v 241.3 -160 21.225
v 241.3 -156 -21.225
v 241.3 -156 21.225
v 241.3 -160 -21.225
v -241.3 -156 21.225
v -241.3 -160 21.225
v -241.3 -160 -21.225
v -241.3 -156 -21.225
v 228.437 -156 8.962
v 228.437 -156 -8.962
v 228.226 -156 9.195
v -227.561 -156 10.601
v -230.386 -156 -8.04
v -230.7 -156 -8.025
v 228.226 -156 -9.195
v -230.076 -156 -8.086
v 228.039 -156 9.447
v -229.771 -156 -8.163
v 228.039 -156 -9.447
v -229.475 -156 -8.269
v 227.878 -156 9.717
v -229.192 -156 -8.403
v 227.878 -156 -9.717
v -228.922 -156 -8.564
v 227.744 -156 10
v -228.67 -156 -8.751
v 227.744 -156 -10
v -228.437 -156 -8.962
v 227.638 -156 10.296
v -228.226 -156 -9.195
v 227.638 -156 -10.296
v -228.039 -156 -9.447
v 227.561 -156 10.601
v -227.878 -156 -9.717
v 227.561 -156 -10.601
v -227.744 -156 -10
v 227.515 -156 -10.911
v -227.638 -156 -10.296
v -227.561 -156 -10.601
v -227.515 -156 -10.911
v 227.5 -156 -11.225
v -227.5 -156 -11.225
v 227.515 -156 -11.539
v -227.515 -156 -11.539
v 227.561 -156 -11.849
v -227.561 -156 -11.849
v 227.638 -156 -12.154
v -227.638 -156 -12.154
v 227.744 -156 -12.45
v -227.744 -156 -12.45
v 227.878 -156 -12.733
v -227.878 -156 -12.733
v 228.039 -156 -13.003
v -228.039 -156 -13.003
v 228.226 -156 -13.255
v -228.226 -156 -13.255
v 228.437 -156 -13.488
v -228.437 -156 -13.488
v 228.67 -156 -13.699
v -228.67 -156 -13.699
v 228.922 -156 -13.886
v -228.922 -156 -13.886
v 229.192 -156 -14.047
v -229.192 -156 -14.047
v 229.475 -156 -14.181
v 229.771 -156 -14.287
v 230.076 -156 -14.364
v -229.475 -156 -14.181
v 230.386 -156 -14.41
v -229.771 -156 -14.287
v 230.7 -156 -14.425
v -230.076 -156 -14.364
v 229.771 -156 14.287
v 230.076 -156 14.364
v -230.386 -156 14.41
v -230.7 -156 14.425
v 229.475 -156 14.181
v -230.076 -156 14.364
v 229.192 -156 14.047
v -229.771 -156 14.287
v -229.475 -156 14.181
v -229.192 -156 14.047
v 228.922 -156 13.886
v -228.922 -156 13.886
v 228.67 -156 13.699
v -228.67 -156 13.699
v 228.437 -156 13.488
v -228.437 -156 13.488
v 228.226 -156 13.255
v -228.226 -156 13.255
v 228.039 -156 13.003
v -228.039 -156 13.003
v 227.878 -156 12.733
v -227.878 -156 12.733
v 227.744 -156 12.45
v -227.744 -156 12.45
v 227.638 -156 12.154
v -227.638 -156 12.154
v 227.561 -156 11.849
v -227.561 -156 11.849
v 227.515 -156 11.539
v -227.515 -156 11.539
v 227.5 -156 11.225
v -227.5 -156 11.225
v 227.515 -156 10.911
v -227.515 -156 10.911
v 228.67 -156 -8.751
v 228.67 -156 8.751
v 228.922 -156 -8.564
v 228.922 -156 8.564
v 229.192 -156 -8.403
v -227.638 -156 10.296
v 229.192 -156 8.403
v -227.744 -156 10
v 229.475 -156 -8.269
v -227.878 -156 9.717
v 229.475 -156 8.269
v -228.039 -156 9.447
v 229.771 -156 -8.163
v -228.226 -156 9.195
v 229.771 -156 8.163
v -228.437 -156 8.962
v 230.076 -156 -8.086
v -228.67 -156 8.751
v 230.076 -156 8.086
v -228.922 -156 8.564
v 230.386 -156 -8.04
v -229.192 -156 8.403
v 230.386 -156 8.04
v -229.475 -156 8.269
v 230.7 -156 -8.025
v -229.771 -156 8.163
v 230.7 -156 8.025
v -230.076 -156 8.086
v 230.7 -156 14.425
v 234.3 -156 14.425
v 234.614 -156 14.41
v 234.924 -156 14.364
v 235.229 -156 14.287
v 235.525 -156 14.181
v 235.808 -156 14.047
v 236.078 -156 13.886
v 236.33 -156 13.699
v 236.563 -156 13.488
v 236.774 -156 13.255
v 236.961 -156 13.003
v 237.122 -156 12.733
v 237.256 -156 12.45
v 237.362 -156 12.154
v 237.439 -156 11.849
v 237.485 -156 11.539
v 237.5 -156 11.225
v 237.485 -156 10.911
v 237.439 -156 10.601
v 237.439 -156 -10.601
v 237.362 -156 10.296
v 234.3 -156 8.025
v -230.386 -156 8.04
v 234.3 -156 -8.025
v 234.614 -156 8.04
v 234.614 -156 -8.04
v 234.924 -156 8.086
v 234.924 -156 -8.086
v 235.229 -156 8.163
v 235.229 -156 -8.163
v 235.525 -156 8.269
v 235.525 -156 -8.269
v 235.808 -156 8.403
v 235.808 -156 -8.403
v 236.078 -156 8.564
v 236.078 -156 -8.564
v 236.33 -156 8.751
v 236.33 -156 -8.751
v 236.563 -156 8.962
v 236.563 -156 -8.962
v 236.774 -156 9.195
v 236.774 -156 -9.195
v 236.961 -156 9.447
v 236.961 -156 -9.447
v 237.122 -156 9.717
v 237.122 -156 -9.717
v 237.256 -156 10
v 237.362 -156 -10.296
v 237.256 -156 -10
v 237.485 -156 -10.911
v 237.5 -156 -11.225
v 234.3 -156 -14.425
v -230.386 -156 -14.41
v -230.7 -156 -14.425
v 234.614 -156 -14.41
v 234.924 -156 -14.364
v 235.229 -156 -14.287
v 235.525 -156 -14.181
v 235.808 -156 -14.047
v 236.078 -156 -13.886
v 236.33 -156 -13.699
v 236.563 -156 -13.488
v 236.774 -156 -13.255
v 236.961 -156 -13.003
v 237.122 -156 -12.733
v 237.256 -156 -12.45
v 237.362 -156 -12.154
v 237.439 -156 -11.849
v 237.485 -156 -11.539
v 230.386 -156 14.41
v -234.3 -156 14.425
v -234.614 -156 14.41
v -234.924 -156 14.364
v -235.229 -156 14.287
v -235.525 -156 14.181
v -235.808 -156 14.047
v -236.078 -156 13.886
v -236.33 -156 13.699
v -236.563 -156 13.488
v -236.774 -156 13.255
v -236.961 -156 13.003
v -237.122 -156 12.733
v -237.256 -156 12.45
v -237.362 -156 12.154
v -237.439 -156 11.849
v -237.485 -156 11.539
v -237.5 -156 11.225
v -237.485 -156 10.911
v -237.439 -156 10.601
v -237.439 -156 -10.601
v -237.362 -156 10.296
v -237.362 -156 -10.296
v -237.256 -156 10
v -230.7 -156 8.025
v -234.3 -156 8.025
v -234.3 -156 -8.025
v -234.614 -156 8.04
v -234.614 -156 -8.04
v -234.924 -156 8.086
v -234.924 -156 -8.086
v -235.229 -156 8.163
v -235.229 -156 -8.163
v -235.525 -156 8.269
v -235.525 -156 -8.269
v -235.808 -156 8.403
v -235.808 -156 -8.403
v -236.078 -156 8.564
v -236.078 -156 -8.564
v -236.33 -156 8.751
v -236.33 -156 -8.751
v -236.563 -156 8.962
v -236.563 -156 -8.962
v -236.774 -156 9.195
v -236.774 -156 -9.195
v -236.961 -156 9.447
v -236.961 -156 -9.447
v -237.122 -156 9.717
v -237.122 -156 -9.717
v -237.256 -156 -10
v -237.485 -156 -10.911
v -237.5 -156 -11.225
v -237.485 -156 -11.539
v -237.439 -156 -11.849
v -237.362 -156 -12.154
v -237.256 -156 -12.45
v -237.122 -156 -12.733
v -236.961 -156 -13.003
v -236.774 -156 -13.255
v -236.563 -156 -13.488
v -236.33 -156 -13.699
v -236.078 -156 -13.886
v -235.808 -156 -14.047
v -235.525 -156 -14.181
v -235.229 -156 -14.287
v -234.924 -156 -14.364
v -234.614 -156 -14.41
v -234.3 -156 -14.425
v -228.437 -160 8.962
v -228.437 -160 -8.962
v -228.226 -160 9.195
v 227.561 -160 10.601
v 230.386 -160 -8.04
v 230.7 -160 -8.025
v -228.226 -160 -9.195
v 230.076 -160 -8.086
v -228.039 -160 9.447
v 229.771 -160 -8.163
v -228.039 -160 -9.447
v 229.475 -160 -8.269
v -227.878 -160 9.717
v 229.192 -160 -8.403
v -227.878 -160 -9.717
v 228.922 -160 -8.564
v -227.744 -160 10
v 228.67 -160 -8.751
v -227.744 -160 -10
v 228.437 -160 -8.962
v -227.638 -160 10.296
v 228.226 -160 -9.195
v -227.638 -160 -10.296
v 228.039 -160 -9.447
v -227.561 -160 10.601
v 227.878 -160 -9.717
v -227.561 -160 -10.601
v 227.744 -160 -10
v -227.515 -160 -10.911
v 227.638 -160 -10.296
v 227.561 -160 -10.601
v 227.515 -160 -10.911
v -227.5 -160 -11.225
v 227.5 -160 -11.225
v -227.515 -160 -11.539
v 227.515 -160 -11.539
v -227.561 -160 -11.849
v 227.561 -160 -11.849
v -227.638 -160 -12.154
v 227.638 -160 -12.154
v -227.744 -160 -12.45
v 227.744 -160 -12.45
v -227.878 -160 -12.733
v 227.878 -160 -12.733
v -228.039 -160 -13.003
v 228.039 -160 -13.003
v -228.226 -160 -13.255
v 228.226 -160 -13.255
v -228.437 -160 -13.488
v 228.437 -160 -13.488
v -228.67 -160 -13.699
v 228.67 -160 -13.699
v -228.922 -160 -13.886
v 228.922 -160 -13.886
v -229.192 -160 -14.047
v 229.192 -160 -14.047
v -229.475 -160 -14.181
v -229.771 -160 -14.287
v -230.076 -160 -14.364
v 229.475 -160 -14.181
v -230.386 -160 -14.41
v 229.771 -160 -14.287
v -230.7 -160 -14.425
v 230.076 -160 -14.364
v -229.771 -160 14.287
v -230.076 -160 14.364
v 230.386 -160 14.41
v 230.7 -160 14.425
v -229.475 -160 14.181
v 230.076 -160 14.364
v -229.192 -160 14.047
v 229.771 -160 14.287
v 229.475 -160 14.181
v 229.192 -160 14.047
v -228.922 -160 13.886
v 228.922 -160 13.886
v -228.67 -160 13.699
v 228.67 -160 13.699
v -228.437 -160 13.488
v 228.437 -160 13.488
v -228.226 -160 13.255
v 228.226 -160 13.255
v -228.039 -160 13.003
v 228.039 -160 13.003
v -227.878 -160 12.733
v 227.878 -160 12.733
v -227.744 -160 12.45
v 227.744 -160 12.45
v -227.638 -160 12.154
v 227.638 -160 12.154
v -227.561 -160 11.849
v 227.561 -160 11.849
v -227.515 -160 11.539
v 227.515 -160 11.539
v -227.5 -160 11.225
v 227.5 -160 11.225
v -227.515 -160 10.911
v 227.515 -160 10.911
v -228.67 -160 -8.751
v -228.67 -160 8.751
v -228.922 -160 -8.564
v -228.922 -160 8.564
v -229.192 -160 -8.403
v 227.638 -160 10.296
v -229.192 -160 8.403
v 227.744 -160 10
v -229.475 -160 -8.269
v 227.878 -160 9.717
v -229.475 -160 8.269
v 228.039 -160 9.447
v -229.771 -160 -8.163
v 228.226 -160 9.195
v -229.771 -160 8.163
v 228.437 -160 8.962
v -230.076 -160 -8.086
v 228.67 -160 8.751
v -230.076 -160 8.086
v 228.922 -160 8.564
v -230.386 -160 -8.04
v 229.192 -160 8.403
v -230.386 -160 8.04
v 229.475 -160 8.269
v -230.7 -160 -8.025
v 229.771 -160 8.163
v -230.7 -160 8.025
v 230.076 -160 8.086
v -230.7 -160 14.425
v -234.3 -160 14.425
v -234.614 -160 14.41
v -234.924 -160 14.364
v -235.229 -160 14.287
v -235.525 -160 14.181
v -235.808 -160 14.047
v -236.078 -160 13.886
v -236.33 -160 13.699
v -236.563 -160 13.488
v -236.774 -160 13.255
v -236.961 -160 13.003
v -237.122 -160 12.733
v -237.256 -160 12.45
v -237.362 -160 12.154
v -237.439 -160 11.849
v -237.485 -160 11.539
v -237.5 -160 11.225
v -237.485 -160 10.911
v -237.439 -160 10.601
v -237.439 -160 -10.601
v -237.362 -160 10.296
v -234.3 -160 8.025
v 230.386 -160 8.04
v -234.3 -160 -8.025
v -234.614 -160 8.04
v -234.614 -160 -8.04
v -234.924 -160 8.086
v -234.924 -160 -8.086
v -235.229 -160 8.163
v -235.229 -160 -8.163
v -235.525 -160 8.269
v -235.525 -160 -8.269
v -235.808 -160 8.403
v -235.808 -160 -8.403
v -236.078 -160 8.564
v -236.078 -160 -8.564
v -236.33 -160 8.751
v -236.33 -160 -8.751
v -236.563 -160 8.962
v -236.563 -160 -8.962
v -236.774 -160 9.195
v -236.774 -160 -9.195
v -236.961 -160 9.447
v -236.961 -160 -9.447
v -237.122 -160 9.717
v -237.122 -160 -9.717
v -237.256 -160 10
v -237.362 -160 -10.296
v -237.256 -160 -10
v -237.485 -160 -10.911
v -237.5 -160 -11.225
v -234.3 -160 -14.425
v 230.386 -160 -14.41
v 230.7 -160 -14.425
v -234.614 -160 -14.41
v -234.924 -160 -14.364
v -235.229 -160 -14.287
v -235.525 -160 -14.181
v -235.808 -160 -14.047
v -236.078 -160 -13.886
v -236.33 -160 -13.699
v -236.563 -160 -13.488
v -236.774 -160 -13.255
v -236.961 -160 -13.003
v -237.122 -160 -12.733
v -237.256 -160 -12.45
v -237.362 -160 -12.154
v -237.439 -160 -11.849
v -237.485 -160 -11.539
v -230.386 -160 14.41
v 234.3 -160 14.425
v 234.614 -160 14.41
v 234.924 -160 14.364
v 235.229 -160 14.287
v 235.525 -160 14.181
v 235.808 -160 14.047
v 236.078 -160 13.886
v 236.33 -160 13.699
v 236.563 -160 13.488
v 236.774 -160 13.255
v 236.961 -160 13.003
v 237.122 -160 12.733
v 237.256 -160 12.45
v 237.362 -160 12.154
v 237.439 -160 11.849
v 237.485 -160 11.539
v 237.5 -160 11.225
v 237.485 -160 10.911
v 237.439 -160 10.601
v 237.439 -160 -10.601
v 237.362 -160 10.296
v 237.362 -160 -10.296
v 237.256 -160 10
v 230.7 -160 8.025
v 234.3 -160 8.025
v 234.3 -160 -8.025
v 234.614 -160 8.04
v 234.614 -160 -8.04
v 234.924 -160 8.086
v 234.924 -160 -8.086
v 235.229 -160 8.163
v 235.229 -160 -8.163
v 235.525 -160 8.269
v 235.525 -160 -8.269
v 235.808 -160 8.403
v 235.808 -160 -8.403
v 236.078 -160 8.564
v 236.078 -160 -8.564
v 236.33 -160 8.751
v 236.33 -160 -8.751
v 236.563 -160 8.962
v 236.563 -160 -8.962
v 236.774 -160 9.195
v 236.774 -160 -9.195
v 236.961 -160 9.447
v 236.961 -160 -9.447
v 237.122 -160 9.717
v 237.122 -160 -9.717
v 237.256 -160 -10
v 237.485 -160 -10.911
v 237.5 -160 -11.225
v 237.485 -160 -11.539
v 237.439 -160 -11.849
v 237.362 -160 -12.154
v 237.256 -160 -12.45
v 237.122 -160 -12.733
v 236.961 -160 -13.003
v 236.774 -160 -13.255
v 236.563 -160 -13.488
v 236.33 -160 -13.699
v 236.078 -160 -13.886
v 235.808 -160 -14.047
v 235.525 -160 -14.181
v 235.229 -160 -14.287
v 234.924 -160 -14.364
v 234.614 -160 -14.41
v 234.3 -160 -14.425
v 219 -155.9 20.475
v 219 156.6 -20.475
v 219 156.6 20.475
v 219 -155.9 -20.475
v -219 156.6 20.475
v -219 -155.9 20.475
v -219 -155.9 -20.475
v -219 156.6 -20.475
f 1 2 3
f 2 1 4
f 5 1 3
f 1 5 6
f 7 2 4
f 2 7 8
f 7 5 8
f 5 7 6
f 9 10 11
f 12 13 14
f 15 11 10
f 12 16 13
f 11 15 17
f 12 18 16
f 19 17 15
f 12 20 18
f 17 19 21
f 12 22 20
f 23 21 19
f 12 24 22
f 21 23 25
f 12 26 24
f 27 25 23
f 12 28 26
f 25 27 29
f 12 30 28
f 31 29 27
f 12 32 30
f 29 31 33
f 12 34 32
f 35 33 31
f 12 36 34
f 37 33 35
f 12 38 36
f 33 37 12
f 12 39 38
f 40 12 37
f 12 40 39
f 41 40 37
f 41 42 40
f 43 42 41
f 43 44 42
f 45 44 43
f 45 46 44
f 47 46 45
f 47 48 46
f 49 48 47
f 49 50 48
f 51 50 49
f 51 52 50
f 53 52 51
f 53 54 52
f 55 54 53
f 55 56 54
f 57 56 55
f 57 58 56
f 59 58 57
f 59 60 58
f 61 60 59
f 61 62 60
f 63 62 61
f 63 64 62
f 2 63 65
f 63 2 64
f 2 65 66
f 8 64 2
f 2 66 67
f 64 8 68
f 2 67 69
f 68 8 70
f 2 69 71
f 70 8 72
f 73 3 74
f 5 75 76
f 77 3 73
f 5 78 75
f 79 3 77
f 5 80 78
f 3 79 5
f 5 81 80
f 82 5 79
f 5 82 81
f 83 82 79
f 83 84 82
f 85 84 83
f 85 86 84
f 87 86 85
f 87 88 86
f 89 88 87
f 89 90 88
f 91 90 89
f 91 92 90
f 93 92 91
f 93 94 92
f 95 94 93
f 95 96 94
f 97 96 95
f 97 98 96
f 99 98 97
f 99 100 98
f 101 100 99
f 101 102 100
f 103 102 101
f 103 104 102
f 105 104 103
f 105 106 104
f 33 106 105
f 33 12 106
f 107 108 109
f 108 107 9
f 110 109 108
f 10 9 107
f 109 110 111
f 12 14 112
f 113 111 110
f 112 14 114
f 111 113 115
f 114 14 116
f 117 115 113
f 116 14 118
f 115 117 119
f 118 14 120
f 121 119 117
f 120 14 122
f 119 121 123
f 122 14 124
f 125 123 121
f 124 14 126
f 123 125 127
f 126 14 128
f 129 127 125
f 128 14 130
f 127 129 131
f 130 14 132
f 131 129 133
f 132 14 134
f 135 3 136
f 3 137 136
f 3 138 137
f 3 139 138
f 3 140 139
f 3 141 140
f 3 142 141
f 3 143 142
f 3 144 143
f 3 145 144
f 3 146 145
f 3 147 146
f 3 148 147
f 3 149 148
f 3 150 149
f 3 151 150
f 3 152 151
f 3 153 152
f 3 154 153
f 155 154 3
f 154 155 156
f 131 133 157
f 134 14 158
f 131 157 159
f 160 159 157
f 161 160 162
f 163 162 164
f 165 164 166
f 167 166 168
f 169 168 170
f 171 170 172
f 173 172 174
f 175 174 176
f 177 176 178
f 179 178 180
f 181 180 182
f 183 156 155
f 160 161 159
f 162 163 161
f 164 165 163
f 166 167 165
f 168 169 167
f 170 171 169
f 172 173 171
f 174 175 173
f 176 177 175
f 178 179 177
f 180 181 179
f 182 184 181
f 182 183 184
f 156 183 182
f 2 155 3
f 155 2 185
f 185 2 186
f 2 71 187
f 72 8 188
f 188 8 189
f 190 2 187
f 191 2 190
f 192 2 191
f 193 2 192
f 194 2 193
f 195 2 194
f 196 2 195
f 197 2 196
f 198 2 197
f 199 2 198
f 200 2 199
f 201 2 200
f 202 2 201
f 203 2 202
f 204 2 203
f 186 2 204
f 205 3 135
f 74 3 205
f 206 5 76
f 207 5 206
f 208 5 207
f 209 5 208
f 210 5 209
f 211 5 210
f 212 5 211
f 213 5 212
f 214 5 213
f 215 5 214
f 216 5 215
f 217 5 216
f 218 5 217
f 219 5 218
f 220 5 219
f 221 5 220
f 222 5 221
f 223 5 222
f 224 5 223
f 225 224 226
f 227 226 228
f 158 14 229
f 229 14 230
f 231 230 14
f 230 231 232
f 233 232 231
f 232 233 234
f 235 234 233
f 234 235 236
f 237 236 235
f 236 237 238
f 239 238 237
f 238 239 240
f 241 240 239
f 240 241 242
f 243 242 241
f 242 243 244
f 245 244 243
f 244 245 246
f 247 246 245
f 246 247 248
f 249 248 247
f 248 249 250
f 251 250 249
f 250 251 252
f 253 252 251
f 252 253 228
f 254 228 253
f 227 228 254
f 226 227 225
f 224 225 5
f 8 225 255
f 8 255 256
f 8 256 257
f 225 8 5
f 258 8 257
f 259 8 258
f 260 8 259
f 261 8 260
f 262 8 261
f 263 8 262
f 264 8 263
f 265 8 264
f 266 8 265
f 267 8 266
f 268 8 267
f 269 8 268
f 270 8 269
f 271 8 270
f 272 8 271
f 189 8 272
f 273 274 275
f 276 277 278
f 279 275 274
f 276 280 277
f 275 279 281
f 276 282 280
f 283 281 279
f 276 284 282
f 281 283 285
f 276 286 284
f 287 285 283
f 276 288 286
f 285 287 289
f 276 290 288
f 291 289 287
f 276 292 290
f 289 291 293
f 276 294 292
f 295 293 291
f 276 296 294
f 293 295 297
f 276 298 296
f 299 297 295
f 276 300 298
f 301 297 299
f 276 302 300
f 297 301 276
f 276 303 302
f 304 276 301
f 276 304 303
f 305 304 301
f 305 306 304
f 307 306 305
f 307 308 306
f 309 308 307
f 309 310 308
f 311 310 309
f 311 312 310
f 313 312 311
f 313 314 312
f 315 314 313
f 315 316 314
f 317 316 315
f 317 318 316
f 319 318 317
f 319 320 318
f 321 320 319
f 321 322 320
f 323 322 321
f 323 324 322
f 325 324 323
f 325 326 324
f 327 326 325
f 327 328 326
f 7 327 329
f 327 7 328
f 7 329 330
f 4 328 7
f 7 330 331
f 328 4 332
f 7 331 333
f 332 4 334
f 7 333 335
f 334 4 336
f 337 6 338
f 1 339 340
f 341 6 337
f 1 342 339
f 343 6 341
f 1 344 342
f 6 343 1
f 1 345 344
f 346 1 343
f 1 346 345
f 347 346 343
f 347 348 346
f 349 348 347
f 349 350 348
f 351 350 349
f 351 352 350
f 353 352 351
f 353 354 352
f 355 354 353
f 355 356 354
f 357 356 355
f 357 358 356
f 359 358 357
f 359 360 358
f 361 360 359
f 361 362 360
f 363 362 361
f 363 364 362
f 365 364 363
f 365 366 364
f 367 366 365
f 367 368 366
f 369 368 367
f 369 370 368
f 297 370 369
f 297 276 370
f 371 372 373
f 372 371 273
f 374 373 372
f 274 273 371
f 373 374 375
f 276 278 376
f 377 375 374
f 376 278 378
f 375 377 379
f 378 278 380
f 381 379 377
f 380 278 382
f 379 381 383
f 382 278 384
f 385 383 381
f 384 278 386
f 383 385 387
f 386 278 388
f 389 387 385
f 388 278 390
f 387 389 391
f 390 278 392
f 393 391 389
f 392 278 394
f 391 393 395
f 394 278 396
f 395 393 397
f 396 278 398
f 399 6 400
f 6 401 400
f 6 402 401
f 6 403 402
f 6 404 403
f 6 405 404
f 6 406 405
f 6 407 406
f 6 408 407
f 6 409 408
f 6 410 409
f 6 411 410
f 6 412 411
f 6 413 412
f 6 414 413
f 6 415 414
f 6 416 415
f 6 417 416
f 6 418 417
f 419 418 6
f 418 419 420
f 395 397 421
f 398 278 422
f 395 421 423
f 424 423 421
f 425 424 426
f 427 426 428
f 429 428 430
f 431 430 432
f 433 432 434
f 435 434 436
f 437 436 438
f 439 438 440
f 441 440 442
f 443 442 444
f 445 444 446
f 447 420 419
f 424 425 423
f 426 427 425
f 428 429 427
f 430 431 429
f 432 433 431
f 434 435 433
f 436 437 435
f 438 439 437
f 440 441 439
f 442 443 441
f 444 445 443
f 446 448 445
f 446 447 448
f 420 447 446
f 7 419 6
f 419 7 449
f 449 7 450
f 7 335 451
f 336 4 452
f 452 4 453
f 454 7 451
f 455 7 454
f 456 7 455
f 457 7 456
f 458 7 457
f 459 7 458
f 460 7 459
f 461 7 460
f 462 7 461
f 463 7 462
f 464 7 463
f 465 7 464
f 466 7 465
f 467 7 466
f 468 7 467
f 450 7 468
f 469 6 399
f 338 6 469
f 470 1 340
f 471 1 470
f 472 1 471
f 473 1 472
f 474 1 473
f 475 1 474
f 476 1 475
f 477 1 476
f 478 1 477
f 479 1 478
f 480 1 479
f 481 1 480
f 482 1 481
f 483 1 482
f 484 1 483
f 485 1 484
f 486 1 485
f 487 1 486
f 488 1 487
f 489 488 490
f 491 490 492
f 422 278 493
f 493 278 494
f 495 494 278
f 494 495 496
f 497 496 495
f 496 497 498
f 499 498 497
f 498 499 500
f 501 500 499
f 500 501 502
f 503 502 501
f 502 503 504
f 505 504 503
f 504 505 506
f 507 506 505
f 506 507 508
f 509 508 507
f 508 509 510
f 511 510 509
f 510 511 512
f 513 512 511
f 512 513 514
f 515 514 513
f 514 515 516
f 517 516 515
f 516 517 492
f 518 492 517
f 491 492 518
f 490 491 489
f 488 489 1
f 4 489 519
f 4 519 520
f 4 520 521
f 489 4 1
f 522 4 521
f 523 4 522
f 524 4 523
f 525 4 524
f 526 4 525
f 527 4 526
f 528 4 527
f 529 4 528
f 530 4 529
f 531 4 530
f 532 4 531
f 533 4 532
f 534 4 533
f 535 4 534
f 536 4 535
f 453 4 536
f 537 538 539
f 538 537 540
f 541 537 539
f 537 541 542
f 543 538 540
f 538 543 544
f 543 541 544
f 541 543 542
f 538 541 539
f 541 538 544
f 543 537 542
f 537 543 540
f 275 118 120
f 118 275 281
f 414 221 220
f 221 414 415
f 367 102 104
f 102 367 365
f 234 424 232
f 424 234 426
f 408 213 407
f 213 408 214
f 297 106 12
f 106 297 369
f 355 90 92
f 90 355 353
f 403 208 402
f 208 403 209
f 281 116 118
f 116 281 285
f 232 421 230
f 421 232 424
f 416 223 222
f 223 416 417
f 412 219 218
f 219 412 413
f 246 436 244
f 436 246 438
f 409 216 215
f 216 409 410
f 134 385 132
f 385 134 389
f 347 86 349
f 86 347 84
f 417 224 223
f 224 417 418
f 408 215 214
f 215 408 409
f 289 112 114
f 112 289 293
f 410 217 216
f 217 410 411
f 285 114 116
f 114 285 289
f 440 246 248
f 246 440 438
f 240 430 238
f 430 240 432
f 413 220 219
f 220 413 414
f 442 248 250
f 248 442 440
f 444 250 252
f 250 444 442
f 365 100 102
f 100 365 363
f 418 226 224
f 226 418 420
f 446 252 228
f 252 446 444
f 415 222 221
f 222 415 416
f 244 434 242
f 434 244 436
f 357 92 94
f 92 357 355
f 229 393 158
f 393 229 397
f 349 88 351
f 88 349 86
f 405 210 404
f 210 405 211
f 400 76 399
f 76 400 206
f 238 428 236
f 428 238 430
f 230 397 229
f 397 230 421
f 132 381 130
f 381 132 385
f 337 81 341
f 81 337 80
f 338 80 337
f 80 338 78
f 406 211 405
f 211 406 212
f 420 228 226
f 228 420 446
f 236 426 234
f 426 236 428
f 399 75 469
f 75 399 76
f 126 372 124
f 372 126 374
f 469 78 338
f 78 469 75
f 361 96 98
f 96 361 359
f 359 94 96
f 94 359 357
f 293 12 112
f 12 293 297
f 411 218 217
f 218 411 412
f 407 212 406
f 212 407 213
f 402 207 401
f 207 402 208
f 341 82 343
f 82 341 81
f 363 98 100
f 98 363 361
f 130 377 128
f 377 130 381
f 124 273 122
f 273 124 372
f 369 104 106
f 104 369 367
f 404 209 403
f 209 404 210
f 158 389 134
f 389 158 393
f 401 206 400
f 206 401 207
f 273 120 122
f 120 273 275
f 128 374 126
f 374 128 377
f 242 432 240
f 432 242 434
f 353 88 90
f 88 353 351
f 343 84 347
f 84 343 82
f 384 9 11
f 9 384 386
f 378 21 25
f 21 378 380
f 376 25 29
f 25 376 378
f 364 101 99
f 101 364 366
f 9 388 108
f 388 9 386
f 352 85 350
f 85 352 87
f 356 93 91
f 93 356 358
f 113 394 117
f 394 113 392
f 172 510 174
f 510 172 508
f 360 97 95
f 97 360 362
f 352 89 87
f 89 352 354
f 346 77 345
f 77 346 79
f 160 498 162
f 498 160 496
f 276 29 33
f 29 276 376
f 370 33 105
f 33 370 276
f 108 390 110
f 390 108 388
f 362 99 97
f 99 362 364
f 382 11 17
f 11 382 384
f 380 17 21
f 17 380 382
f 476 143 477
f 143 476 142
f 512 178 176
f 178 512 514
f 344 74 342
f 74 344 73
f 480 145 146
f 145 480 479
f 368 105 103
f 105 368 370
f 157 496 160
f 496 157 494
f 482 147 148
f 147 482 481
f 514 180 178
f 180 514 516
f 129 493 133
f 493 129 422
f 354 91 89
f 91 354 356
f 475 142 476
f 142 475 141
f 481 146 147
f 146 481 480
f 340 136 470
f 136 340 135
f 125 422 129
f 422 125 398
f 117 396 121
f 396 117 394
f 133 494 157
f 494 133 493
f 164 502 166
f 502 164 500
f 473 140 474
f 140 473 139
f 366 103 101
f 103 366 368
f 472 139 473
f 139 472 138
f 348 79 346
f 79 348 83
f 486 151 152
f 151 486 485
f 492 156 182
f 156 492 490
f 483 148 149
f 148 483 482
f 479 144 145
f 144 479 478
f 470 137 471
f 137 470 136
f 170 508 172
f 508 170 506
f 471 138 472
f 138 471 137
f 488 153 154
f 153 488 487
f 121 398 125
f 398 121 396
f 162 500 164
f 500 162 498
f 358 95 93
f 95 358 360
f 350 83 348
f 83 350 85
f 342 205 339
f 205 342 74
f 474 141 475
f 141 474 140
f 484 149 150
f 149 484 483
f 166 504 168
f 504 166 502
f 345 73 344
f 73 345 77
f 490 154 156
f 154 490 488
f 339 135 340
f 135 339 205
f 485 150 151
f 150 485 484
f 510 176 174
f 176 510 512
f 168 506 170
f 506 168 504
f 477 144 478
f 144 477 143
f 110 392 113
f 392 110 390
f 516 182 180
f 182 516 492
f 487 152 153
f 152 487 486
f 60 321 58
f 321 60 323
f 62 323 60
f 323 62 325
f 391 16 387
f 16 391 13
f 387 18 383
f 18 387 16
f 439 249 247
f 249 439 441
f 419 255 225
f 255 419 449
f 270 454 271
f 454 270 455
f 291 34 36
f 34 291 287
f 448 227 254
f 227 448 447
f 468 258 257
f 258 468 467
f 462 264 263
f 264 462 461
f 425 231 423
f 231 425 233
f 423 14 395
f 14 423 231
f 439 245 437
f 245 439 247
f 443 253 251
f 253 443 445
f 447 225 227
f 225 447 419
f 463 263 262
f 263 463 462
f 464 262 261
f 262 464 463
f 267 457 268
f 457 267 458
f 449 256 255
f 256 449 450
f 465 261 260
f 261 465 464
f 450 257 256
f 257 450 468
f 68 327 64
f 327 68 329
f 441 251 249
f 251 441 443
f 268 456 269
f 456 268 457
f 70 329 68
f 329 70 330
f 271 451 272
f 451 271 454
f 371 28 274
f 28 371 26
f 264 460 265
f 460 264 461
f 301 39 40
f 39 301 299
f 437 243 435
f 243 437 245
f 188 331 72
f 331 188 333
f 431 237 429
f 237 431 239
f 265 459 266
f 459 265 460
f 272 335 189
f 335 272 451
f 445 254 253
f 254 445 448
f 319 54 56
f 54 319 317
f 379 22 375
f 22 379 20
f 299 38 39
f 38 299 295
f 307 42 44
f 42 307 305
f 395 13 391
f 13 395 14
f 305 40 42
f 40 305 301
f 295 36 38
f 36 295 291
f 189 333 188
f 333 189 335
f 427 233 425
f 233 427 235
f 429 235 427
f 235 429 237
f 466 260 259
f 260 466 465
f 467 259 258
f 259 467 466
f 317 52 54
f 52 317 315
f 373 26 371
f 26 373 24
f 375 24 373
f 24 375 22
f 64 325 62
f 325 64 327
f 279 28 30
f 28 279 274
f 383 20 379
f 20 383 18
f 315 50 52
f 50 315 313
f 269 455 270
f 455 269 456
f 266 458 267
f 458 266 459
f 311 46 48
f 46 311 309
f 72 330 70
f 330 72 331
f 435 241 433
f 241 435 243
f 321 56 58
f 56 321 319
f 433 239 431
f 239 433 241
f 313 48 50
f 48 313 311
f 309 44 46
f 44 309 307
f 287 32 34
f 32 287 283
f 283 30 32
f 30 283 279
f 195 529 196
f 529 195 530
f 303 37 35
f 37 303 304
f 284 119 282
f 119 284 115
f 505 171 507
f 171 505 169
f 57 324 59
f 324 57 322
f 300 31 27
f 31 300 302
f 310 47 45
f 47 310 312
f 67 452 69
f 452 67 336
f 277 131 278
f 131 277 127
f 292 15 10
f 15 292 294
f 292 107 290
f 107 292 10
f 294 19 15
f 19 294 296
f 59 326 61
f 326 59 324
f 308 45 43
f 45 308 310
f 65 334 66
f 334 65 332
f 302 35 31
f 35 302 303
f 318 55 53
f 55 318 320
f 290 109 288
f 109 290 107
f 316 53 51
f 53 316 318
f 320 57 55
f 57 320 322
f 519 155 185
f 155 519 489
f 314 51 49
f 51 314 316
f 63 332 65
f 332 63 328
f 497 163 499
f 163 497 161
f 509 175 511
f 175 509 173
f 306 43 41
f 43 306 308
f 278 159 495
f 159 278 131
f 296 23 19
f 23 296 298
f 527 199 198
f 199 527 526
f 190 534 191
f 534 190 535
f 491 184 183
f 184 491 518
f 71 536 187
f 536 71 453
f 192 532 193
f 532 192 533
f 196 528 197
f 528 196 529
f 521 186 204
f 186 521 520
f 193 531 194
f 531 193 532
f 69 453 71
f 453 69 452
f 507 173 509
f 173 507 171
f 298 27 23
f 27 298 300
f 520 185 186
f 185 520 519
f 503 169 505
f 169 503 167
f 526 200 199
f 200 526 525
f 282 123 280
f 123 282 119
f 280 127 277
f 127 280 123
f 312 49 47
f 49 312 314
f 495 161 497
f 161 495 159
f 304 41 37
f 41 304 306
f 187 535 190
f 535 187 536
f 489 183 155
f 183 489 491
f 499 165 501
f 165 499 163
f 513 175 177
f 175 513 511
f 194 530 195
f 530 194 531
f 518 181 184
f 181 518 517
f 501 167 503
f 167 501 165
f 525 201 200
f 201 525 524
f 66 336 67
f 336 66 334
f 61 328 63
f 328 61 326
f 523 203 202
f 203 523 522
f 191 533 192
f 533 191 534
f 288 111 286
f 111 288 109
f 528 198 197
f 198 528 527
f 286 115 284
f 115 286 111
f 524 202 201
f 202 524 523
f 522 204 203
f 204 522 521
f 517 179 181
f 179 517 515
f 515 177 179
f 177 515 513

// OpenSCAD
// ============================================================================
// Atom Lithography Machine — Parametric OpenSCAD Module (S3.3-03)
// ============================================================================
// part_id           : S3.3-03
// parent_bom_id     : S3.3
// subsystem         : S3
// part_name         : Cok-kanalli 12-bit darbe-genligi ADC sayisallastirici ara-karti
// material          : Al 6061
// temp_stage        : 300 K (kabin)
// vacuum_grade      : Atmosfer
// tolerance         : ±1 LSB
// computed_mass_kg  : 2.56522
// envelope_mm       : 482.600 x 353.000 x 42.450
// design_maturity   : M0_M1_DETAILED_CAD_DESIGN_ONLY
// no_lab_measurement: true
// iec61508_certified: false
// semi_s2_certified : false
// Units: millimeters (mm)
// ============================================================================

$fn = 64;

// Nominal bounding envelope parameters (mm)
bbox_x = 482.6000;
bbox_y = 353.0000;
bbox_z = 42.4500;

// Part-specific parametric dimensions
fmc_width_mm = 69.0;
fmc_length_mm = 76.5;
sample_rate_msps = 50;
adc_bits = 12;

// Interface / port parameters (mm)

module part_S3_3_03() {
  difference() {
    union() {
      // 19-inch EIA-310 1U front faceplate (482.6 x 42.5 mm, facing -Y)
      translate([0.000, -158.000, 0.000]) cube([482.600, 4.000, 42.450], center=true);
      // Hollow EMI-shielded chassis body
      translate([0.000, 0.350, 0.000]) cube([438.000, 312.500, 40.950], center=true);
    }
    // EIA-310 upper-left rack ear slot
    translate([-232.500, -158.000, 11.225]) rotate([90.000, 0.000, 0.000]) {
      hull() {
        translate([-1.800, 0, 0]) cylinder(d=6.400, h=8.000, center=true);
        translate([1.800, 0, 0]) cylinder(d=6.400, h=8.000, center=true);
      }
    }
    // EIA-310 upper-right rack ear slot
    translate([232.500, -158.000, 11.225]) rotate([90.000, 0.000, 0.000]) {
      hull() {
        translate([-1.800, 0, 0]) cylinder(d=6.400, h=8.000, center=true);
        translate([1.800, 0, 0]) cylinder(d=6.400, h=8.000, center=true);
      }
    }
    // EIA-310 lower-left rack ear slot
    translate([-232.500, -158.000, -11.225]) rotate([90.000, 0.000, 0.000]) {
      hull() {
        translate([-1.800, 0, 0]) cylinder(d=6.400, h=8.000, center=true);
        translate([1.800, 0, 0]) cylinder(d=6.400, h=8.000, center=true);
      }
    }
    // EIA-310 lower-right rack ear slot
    translate([232.500, -158.000, -11.225]) rotate([90.000, 0.000, 0.000]) {
      hull() {
        translate([-1.800, 0, 0]) cylinder(d=6.400, h=8.000, center=true);
        translate([1.800, 0, 0]) cylinder(d=6.400, h=8.000, center=true);
      }
    }
  }
}

// World assembly mounting transform (global machine frame, mm / deg):
// translate([1480.000, -250.000, 679.025]) rotate([0.000, 0.000, 0.000]) part_S3_3_03();

part_S3_3_03();
